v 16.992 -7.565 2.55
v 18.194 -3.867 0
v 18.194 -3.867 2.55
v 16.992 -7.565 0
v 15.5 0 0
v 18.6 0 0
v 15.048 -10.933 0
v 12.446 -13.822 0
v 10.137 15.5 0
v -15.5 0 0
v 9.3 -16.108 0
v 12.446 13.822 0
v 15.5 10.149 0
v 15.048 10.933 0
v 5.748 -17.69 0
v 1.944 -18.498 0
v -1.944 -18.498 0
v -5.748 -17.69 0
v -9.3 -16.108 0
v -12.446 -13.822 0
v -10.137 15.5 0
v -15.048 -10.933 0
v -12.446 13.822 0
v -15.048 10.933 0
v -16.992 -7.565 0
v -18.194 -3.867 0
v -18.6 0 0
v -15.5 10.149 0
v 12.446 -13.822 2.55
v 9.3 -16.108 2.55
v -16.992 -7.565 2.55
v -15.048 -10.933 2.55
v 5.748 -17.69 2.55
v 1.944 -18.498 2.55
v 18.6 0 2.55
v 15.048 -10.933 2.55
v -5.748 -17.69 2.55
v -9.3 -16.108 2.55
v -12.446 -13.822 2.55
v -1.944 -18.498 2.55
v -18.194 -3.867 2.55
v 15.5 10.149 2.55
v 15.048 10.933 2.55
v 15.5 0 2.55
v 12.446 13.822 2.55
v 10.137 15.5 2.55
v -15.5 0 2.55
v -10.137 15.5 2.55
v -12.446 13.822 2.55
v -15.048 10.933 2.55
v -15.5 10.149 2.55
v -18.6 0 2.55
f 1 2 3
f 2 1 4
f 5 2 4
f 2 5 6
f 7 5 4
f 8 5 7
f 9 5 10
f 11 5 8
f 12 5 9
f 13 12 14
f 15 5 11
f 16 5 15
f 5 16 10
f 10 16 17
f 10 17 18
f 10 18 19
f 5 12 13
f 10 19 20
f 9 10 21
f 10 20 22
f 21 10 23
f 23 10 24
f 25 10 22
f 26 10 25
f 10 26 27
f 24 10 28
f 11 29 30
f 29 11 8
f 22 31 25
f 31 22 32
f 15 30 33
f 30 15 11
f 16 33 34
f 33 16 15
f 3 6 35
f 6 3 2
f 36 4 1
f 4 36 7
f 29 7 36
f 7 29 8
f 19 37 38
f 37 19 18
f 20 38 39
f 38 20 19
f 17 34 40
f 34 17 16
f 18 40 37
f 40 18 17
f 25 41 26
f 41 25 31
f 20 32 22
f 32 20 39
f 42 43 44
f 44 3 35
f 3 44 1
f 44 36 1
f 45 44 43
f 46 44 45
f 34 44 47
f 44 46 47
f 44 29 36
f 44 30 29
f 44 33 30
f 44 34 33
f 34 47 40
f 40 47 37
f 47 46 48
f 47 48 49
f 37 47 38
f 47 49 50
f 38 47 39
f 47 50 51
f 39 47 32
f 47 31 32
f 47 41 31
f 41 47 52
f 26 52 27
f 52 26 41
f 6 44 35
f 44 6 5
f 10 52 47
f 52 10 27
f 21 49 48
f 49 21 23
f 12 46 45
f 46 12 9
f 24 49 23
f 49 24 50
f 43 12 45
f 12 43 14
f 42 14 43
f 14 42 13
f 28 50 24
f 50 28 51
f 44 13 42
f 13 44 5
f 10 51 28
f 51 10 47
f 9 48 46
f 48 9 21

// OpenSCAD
// file: args.scad
// coin
coin_radius = 22 / 2;
coin_thickness = 1.55;
coin_numbers = 50;
coin_height = coin_thickness * coin_numbers;


// case
coin_tolerance = 1;
coin_insert_radius = coin_radius + coin_tolerance / 2;

case_radius = 30 / 2;
case_height = 94;


// chember
case_tolerance = 4;
case_hole_radius = case_radius + case_tolerance / 2;

case_hole_height = case_height + case_tolerance;
chember_radius = case_hole_radius + coin_thickness*2;


// filer
filer_tolerance = 1;
filer_hole_radius = coin_radius + filer_tolerance;

filer_radius = case_radius;
filer_height = case_height;


// key
key_tolerance = 1;
key_width = case_radius + key_tolerance / 2;

key_thickness = coin_thickness + key_tolerance;
key_radius = key_width + coin_thickness*2;


// shovel
shovel_coin_numbers = 5;
shovel_radius = 30 / 2;
shovel_bottom = 2;
// main file
include <args.scad>

difference(){
    cylinder(h = key_thickness, r = key_radius, center = false);
    translate([0, key_radius/2, 0]){
        cube([key_radius*2, key_radius, key_thickness*2], center = true);
    }
}
intersection(){
    cylinder(h = key_thickness, r = key_radius, center = false);
    translate([0, 0, key_thickness]){
        cube([key_width*2, key_width*2, key_thickness*2], center = true);
    }
}
